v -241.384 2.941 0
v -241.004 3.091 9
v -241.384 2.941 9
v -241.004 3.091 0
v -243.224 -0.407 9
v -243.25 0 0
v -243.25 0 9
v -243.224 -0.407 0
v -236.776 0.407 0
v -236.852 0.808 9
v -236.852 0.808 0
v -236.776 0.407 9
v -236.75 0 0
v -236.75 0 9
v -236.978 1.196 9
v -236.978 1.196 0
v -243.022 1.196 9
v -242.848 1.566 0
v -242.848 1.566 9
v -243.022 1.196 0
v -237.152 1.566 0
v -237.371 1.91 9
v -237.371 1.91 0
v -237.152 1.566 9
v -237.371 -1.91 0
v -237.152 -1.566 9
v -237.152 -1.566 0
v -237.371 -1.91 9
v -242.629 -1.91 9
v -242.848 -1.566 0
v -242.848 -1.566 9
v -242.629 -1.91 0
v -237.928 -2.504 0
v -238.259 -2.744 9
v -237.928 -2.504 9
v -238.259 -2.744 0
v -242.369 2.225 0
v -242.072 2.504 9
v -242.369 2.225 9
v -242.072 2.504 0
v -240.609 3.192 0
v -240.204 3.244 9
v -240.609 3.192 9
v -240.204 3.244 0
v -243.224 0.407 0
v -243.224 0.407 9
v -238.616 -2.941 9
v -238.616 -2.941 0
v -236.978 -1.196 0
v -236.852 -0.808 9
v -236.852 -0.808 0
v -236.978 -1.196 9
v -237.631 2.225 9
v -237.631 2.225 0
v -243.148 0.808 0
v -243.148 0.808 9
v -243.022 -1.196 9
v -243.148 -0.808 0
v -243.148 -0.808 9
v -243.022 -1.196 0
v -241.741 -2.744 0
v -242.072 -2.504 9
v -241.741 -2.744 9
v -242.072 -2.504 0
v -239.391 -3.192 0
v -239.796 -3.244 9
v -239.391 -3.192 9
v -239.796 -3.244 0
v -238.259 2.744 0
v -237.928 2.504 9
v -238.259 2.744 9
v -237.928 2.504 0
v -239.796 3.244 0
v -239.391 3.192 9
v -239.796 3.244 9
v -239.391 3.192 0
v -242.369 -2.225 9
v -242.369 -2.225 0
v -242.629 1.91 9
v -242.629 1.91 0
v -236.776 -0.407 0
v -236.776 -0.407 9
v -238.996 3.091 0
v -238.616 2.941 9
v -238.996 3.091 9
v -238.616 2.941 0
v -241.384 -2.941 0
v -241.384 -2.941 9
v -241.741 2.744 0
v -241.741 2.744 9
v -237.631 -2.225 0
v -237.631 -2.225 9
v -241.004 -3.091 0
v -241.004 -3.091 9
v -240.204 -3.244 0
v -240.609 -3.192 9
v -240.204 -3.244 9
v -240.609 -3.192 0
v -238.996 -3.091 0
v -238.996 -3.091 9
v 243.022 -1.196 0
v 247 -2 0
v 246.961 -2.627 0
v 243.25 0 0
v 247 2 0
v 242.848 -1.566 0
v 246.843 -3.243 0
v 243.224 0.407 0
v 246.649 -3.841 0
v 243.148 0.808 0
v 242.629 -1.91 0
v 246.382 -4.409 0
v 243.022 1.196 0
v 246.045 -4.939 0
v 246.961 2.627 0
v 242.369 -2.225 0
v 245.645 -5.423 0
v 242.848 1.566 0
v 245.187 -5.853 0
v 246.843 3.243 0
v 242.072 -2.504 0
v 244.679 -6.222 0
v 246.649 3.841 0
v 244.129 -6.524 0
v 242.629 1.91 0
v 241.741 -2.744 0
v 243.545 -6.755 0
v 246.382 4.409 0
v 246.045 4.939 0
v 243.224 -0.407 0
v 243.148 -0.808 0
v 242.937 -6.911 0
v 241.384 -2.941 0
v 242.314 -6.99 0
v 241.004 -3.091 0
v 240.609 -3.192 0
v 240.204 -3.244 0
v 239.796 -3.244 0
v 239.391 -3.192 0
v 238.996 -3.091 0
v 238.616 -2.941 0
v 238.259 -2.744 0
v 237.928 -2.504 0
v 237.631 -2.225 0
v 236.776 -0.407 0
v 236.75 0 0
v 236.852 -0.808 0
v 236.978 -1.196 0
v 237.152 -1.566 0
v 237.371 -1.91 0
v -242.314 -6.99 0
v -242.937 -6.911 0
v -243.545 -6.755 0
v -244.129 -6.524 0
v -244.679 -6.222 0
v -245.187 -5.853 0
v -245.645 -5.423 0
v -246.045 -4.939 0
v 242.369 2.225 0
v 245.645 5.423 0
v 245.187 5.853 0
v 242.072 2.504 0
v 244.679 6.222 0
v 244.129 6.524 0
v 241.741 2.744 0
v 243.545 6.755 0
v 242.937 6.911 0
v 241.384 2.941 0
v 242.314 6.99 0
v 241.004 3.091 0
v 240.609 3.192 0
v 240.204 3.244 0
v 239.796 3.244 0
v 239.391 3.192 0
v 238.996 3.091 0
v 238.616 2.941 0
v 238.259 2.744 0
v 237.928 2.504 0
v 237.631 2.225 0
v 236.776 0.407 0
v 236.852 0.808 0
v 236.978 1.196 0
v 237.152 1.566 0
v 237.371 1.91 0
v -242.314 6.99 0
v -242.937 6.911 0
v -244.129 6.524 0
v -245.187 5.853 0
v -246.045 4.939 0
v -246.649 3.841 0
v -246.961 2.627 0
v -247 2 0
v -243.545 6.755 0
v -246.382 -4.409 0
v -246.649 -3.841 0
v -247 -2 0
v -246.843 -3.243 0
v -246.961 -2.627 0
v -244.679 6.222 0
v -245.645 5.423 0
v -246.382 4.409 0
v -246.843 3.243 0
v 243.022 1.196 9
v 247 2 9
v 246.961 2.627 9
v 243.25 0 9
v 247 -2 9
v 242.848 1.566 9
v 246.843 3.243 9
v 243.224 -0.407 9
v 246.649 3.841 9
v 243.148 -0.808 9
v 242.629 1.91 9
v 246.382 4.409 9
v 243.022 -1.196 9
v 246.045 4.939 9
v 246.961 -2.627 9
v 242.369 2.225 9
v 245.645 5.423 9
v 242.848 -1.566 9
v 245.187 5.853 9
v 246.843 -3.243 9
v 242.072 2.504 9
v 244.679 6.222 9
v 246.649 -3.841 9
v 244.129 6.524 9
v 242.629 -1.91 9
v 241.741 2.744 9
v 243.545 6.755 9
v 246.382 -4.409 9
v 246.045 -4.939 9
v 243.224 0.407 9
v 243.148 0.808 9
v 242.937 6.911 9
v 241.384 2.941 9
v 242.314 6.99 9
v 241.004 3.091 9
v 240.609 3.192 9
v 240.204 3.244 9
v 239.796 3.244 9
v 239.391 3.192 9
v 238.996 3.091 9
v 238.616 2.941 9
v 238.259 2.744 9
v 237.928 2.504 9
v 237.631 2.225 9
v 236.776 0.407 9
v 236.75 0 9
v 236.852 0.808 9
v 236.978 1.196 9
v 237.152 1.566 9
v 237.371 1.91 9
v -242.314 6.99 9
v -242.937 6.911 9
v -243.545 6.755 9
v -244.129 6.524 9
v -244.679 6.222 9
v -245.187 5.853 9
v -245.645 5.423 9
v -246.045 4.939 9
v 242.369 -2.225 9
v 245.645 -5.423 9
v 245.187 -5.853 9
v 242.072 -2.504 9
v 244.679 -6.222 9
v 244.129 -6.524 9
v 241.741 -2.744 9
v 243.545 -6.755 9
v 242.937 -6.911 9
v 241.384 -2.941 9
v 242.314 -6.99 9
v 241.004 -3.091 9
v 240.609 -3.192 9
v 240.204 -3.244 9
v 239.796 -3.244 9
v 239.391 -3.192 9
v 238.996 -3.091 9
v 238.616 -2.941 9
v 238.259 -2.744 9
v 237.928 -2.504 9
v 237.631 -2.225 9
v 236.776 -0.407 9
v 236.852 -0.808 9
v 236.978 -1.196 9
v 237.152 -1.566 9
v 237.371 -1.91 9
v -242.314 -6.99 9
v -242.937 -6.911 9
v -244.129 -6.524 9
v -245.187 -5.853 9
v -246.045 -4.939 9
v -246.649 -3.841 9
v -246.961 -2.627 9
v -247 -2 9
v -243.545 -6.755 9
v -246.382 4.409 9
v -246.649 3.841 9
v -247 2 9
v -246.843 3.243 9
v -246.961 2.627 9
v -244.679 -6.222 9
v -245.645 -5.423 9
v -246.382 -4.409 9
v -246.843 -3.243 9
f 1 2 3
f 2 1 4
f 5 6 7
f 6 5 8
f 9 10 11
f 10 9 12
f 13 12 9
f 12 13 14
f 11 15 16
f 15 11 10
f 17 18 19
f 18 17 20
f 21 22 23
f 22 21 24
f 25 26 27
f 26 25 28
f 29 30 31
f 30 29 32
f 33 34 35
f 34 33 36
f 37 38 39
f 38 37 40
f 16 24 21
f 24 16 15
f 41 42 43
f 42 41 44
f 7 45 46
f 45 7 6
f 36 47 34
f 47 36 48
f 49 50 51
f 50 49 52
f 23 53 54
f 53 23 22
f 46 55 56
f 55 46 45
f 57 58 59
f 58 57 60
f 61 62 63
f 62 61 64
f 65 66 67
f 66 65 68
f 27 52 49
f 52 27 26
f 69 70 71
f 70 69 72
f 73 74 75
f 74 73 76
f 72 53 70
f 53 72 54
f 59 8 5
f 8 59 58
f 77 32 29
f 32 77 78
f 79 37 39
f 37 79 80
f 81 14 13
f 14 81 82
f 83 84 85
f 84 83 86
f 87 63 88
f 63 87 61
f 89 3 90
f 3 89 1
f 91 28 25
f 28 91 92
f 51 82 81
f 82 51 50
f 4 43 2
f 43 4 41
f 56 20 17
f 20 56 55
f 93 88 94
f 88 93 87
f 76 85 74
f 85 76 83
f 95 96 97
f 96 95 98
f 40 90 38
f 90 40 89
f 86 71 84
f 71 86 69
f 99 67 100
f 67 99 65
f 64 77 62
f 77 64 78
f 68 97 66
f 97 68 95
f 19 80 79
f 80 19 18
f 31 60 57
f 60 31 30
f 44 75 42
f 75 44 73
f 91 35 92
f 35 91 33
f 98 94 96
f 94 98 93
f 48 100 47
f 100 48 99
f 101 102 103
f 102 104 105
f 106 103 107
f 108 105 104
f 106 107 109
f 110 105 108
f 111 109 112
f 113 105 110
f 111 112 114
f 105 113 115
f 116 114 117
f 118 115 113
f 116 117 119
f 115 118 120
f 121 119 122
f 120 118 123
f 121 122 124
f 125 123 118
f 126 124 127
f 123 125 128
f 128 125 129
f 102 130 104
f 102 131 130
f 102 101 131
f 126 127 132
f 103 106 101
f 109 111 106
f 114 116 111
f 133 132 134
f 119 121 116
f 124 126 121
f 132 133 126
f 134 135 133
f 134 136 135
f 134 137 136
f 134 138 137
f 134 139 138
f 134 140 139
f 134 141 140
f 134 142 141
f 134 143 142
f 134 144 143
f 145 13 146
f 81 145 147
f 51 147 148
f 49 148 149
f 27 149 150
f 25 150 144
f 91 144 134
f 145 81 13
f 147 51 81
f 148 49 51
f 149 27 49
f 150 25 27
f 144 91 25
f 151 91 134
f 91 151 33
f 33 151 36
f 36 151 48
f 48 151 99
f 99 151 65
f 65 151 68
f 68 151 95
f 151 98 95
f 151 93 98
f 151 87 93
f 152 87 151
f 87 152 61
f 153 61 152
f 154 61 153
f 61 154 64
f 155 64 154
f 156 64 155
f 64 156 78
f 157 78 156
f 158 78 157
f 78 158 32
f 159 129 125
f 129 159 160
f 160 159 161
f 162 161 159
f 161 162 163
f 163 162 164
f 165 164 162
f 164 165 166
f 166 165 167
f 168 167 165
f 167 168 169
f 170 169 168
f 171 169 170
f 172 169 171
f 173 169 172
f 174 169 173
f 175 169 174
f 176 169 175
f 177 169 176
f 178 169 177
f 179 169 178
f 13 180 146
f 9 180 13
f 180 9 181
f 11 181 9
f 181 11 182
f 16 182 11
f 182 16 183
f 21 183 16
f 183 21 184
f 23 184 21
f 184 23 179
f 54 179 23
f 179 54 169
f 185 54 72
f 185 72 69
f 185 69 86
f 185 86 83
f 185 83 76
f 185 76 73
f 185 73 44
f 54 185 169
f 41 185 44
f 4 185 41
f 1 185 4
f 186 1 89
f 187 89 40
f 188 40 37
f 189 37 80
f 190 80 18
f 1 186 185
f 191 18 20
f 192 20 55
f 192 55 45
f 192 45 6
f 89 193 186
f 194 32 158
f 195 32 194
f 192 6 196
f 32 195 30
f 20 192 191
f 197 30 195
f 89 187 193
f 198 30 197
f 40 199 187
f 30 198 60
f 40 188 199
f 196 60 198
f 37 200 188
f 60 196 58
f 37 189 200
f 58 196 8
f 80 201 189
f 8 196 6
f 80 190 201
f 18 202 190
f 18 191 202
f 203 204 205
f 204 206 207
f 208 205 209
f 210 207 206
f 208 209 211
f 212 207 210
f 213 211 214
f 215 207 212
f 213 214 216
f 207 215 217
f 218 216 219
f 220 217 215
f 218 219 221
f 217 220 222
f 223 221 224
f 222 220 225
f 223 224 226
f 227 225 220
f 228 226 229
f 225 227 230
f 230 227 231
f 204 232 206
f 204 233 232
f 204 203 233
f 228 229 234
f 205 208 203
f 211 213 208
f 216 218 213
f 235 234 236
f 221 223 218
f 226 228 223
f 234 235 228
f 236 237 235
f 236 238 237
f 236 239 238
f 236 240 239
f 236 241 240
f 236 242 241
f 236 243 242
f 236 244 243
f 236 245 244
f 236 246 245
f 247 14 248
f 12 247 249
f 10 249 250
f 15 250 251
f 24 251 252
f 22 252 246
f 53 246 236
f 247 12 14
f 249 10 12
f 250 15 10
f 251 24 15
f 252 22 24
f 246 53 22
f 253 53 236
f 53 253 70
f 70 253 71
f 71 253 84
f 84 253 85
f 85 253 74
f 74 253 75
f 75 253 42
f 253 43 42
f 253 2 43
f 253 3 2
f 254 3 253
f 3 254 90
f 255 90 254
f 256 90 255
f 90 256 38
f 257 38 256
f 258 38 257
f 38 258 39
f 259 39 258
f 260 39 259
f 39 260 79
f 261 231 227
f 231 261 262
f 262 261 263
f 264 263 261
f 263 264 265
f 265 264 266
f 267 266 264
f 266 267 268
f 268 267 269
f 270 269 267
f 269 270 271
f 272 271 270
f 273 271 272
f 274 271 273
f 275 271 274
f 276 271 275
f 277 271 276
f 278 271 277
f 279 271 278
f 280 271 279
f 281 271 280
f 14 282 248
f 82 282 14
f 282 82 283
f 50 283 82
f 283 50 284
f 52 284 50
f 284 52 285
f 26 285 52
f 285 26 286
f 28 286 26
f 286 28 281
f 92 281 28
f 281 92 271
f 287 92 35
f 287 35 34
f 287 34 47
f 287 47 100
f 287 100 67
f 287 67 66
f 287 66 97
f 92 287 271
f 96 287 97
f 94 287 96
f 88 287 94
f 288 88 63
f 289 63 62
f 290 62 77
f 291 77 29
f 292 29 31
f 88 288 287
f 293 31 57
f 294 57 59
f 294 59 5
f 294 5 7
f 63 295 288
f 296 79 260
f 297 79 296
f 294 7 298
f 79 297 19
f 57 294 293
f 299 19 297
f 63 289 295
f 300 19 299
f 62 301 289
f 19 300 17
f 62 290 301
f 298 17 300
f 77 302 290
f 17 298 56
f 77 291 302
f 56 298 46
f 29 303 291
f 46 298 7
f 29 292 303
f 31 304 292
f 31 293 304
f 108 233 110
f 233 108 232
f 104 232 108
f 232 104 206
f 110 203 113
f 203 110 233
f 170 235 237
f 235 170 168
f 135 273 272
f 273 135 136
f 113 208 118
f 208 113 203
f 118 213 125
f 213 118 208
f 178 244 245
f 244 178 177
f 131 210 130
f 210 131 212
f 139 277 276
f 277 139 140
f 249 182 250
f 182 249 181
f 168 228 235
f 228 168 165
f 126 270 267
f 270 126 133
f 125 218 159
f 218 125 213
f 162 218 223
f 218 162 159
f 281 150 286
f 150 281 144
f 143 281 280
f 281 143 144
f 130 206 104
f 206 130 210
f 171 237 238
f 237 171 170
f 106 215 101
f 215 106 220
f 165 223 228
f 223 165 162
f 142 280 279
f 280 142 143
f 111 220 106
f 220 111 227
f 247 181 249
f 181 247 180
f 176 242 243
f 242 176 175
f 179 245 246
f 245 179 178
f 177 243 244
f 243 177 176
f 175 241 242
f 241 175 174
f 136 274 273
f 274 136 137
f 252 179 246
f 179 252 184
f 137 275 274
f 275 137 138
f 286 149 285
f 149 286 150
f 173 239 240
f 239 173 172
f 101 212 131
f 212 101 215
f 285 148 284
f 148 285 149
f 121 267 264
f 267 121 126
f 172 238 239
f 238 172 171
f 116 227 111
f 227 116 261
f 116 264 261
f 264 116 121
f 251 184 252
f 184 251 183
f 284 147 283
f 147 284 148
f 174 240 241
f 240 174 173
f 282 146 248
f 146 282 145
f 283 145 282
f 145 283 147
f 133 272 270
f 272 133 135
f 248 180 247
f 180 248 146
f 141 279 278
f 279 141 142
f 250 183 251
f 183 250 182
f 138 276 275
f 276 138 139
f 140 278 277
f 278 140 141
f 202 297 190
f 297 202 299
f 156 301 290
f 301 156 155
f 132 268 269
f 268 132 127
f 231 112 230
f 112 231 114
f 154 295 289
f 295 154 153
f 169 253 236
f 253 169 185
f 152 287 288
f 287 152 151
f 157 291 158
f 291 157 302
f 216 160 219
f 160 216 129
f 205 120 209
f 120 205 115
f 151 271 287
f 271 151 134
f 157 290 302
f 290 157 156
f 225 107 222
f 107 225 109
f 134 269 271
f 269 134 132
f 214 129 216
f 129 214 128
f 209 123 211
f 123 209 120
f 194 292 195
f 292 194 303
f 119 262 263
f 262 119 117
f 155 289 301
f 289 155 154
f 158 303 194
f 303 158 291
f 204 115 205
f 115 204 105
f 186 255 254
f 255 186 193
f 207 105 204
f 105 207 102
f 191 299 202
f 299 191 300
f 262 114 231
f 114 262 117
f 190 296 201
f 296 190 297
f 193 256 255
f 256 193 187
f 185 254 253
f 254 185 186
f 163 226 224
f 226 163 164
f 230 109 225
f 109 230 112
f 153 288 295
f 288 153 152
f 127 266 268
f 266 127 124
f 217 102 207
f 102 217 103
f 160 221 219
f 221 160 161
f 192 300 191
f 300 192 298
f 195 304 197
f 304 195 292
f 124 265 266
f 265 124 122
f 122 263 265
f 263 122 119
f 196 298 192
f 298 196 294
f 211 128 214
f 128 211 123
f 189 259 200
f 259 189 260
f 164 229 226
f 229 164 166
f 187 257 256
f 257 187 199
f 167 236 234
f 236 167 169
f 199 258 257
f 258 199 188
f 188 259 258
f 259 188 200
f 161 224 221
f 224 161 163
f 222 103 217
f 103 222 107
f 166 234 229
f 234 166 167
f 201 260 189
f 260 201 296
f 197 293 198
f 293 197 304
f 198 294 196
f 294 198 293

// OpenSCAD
$fn = 50;


difference() {
	union() {
		hull() {
			translate(v = [-242.0000000000, 2.0000000000, 0]) {
				cylinder(h = 9, r = 5);
			}
			translate(v = [242.0000000000, 2.0000000000, 0]) {
				cylinder(h = 9, r = 5);
			}
			translate(v = [-242.0000000000, -2.0000000000, 0]) {
				cylinder(h = 9, r = 5);
			}
			translate(v = [242.0000000000, -2.0000000000, 0]) {
				cylinder(h = 9, r = 5);
			}
		}
	}
	union() {
		translate(v = [-240.0000000000, 0.0000000000, 0]) {
			cylinder(h = 9, r = 3.2500000000);
		}
		translate(v = [240.0000000000, 0.0000000000, 0]) {
			cylinder(h = 9, r = 3.2500000000);
		}
		translate(v = [-240.0000000000, 0.0000000000, 0]) {
			cylinder(h = 9, r = 1.8000000000);
		}
		translate(v = [240.0000000000, 0.0000000000, 0]) {
			cylinder(h = 9, r = 1.8000000000);
		}
		translate(v = [-240.0000000000, 0.0000000000, 0]) {
			cylinder(h = 9, r = 1.8000000000);
		}
		translate(v = [240.0000000000, 0.0000000000, 0]) {
			cylinder(h = 9, r = 1.8000000000);
		}
		translate(v = [-240.0000000000, 0.0000000000, 0]) {
			cylinder(h = 9, r = 1.8000000000);
		}
		translate(v = [240.0000000000, 0.0000000000, 0]) {
			cylinder(h = 9, r = 1.8000000000);
		}
	}
}
